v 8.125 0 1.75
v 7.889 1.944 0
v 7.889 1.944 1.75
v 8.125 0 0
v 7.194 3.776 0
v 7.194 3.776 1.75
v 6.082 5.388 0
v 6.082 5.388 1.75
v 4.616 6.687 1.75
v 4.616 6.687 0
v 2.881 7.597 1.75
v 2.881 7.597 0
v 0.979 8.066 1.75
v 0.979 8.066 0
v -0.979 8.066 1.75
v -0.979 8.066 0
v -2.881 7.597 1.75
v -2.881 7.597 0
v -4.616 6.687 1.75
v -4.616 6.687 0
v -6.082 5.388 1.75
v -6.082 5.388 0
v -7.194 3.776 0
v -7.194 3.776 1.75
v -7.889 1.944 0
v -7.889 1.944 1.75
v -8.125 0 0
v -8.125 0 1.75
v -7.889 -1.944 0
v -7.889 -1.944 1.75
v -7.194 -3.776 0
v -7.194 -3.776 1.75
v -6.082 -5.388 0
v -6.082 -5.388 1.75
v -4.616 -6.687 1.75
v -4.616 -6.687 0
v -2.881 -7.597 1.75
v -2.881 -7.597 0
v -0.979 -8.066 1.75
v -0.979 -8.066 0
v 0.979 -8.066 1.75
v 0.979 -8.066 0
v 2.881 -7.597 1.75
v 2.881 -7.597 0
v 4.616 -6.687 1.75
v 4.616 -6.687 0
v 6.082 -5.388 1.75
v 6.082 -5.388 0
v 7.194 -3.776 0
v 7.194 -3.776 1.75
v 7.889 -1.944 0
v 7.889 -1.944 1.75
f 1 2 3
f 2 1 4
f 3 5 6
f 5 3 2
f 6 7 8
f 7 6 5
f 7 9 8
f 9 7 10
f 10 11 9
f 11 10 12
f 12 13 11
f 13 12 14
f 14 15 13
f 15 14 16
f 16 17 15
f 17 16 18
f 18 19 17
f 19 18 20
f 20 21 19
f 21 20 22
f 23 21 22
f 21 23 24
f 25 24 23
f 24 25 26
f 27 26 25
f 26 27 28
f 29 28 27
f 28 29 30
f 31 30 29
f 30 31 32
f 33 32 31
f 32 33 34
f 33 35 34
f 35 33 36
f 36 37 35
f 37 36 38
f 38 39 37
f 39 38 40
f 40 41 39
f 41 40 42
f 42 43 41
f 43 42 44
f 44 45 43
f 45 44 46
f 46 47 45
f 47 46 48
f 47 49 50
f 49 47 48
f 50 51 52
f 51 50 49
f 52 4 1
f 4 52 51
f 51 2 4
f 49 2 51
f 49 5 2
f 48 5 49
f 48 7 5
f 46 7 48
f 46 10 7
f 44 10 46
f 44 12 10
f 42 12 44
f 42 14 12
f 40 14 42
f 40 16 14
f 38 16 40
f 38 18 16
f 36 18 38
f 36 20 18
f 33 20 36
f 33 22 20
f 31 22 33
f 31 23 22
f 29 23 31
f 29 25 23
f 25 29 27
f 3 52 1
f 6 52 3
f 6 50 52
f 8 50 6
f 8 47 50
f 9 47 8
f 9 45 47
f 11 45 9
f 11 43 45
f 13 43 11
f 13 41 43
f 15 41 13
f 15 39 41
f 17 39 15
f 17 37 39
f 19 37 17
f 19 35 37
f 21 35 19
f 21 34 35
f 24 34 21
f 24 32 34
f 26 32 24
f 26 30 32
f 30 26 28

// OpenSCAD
//###############################################################################
//# DIY Laser Bed - Euro-Cent                                                   #
//###############################################################################
//#    Copyright 2020 Dirk Heisswolf                                            #
//#    This file is part of the DIY Laser Bed project.                          #
//#                                                                             #
//#    This project is free software: you can redistribute it and/or modify     #
//#    it under the terms of the GNU General Public License as published by     #
//#    the Free Software Foundation, either version 3 of the License, or        #
//#    (at your option) any later version.                                      #
//#                                                                             #
//#    This project is distributed in the hope that it will be useful,          #
//#    but WITHOUT ANY WARRANTY; without even the implied warranty of           #
//#    MERCHANTABILITY or FITNESS FOR A PARTICULAR PURPOSE.  See the            #
//#    GNU General Public License for more details.                             #
//#                                                                             #
//#    You should have received a copy of the GNU General Public License        #
//#    along with this project.  If not, see <http://www.gnu.org/licenses/>.    #
//#                                                                             #
//#    This project makes use of the NopSCADlib library                         #
//#    (see https://github.com/nophead/NopSCADlib).                             #
//#                                                                             #
//###############################################################################
//# Description:                                                                #
//#   A model of an Euro-Cent coin.                                             #
//#                                                                             #
//###############################################################################
//# Version History:                                                            #
//#   February 17, 2020                                                         #
//#      - Initial release                                                      #
//#                                                                             #
//###############################################################################

module Cent() {
    
    //color("gold"){ cylinder(1.67,d=16.25); }    
    color("gold"){ cylinder(1.75,d=16.25); }    
}

//Demo coin
Cent();
